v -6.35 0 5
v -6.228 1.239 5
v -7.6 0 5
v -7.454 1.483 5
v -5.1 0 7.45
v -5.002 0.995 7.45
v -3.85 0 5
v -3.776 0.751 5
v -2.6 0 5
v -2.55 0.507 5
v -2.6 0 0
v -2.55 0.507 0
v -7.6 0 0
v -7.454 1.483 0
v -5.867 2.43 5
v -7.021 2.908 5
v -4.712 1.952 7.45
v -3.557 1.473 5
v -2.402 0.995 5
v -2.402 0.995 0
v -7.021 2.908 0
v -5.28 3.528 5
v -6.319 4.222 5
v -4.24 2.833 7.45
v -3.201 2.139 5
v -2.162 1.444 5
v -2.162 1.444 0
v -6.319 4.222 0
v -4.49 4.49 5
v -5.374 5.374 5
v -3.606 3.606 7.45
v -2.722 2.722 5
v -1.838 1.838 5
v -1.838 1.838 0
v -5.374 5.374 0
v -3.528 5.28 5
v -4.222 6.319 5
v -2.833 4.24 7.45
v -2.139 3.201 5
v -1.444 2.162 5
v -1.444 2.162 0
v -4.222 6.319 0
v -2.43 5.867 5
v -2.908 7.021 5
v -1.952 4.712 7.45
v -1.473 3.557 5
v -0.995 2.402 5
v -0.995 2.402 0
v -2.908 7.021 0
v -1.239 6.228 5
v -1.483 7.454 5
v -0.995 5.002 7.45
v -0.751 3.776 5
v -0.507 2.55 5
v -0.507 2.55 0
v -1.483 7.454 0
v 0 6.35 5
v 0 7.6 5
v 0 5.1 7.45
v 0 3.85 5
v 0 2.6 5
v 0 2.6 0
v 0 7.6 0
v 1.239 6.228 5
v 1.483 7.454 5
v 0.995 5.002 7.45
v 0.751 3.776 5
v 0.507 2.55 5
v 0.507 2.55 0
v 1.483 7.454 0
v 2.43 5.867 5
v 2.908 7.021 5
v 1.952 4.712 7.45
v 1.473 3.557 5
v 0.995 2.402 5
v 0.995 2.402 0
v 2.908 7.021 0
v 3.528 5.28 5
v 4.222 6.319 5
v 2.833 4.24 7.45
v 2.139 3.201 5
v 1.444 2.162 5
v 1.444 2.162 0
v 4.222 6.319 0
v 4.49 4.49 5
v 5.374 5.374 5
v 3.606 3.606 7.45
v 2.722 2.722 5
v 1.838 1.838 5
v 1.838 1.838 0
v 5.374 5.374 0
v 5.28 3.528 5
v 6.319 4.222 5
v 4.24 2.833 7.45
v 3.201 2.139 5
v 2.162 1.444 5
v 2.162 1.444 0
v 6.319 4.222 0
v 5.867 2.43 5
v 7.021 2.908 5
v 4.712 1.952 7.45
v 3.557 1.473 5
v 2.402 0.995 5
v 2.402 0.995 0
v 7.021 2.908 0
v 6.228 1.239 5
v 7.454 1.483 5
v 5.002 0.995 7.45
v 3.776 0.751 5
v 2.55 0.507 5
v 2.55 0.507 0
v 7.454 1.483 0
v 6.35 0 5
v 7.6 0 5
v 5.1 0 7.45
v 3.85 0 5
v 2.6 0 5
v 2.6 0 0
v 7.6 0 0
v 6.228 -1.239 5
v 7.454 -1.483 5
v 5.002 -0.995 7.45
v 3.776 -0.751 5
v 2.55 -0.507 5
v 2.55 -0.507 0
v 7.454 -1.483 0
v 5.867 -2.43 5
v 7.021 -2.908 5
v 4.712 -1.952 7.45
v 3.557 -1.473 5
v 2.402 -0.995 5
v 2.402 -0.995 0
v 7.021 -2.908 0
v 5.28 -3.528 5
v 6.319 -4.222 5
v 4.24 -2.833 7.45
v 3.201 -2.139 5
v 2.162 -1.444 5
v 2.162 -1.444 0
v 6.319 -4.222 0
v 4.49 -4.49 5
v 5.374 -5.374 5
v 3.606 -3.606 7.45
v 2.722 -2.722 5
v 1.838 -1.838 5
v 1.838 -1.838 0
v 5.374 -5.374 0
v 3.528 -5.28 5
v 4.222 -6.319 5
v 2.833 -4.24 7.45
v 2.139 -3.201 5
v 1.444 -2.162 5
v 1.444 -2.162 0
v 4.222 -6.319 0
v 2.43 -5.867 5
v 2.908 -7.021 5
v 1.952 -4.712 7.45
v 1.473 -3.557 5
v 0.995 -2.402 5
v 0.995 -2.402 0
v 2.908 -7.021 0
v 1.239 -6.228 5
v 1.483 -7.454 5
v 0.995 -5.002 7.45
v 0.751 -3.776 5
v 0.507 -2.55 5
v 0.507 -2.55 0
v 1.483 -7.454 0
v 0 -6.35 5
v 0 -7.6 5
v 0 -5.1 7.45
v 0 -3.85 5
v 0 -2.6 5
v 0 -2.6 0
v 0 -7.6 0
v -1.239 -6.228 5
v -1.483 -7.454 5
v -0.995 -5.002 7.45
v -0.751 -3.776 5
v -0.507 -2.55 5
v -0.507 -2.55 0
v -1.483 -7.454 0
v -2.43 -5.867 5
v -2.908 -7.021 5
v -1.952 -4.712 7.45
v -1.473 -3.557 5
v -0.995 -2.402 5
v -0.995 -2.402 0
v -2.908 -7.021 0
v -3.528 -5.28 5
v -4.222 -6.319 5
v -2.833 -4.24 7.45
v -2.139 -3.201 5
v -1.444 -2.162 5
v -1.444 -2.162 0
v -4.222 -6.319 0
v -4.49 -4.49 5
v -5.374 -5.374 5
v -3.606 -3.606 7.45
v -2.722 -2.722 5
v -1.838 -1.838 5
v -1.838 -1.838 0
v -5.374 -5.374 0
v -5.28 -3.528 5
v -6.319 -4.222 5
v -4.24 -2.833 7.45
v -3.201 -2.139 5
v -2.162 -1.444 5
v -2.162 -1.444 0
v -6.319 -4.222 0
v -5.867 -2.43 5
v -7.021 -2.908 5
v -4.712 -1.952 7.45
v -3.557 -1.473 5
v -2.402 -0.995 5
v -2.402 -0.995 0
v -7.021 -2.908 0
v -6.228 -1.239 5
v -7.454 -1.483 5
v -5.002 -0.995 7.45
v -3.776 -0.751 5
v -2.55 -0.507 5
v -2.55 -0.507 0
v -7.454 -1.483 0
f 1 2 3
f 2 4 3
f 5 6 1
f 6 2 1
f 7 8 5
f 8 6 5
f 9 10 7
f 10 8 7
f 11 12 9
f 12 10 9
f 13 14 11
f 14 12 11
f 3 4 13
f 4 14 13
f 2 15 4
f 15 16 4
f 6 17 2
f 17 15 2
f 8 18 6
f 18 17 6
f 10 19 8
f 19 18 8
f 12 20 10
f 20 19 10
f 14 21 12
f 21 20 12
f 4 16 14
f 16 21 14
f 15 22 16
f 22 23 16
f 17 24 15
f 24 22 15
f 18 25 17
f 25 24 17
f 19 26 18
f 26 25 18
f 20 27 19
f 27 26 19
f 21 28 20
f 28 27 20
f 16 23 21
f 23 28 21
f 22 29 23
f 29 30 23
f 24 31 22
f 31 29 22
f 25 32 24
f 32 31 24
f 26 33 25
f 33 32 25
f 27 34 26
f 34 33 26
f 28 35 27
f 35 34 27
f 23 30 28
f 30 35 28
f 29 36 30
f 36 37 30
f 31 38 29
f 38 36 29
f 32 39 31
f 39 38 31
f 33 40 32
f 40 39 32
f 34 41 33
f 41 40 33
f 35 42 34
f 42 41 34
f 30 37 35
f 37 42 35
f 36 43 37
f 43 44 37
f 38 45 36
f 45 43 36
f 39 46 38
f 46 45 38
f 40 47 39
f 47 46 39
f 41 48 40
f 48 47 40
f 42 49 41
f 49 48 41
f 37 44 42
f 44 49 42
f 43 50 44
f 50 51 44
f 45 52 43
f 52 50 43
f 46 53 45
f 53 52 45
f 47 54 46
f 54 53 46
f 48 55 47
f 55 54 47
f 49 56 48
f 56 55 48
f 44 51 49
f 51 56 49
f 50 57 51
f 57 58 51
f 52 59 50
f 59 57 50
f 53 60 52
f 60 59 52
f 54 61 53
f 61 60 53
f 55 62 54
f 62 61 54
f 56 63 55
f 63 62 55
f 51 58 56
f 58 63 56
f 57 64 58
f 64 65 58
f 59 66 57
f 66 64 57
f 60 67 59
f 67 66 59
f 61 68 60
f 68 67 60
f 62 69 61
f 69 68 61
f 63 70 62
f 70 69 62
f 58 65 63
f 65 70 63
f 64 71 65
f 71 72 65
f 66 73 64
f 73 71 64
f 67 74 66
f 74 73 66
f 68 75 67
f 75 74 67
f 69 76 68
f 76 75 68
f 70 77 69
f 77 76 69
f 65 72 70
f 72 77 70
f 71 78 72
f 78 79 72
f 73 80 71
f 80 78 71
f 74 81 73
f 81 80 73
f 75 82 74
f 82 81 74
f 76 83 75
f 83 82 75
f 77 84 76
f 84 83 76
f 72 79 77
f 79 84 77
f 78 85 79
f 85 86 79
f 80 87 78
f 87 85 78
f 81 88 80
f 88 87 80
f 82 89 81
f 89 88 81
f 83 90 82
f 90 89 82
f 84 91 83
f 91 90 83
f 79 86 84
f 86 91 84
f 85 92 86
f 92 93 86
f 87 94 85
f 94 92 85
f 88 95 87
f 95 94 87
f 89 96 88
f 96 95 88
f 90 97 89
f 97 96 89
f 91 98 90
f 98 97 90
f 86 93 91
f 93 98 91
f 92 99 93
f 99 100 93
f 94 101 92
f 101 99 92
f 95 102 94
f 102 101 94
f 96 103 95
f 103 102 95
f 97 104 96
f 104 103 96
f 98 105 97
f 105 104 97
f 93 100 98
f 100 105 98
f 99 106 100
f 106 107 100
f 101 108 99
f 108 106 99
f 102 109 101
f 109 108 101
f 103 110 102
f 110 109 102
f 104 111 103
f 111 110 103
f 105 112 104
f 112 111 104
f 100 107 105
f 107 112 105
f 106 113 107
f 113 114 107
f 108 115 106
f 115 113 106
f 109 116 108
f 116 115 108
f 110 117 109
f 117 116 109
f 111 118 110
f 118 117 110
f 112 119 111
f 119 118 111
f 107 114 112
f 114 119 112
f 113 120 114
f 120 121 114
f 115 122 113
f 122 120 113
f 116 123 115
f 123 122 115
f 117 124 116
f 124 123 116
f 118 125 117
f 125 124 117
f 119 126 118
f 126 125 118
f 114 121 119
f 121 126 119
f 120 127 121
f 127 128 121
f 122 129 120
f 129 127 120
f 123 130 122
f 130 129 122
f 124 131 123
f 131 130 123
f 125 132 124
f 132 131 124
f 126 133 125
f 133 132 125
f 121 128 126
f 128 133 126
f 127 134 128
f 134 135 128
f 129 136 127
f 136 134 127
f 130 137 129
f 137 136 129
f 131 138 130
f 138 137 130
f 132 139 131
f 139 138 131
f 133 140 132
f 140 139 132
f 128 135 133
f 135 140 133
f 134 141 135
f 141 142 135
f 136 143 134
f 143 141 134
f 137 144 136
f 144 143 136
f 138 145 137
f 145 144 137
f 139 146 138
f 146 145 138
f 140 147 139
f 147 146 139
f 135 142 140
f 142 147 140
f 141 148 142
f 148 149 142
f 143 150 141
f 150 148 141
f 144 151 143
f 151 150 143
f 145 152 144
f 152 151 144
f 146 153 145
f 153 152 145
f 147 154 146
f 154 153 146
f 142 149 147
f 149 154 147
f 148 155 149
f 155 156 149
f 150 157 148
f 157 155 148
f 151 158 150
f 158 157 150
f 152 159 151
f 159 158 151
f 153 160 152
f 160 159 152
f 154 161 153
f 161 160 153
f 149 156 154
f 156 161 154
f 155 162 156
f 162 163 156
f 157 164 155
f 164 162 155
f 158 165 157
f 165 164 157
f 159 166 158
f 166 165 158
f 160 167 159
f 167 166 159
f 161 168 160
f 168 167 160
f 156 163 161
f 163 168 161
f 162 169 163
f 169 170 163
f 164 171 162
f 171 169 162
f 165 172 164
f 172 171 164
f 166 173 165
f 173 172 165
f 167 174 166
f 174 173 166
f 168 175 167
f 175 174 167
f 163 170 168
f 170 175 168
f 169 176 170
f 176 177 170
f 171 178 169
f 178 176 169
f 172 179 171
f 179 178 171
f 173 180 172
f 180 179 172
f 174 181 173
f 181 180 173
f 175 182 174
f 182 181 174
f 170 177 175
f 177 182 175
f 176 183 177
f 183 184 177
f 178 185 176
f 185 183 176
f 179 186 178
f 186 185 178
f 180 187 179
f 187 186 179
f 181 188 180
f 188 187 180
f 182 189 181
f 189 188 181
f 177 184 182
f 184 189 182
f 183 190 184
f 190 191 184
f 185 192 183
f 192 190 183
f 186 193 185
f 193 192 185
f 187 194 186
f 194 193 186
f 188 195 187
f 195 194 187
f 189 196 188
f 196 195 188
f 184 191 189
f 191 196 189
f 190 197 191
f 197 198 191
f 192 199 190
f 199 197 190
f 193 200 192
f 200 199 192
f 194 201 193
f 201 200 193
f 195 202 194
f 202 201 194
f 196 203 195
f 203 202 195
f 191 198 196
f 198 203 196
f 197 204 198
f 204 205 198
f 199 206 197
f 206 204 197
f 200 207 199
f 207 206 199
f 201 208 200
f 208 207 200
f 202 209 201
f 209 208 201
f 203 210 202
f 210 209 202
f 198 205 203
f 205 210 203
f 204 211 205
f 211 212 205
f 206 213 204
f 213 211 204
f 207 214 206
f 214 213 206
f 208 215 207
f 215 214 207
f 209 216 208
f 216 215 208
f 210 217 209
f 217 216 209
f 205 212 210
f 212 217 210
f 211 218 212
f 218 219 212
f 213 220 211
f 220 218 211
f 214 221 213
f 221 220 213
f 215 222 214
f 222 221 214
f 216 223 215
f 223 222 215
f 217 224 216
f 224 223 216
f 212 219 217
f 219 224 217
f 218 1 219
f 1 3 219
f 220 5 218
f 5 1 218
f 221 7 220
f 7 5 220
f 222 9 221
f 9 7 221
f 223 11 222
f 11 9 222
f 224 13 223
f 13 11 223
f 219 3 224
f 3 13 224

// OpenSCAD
$fn = 32;

// ----------------------------------------------------------------------
// Form washer: domed washer, 15.2 mm outside, 5.2 mm bore
// ----------------------------------------------------------------------

// --- parameters (mm) ---
revolve_angle = 360;      // full turn around the Z axis
profile_points = 7;       // points of the closed outline

profile = [[2.6, 0], [7.6, 0], [7.6, 5], [6.35, 5], [5.1, 7.45], [3.85, 5], [2.6, 5]];  // single closed polygon, 7 points, counter clockwise

// --- the one profile operation ---
rotate_extrude(angle = revolve_angle) polygon(points = profile);
